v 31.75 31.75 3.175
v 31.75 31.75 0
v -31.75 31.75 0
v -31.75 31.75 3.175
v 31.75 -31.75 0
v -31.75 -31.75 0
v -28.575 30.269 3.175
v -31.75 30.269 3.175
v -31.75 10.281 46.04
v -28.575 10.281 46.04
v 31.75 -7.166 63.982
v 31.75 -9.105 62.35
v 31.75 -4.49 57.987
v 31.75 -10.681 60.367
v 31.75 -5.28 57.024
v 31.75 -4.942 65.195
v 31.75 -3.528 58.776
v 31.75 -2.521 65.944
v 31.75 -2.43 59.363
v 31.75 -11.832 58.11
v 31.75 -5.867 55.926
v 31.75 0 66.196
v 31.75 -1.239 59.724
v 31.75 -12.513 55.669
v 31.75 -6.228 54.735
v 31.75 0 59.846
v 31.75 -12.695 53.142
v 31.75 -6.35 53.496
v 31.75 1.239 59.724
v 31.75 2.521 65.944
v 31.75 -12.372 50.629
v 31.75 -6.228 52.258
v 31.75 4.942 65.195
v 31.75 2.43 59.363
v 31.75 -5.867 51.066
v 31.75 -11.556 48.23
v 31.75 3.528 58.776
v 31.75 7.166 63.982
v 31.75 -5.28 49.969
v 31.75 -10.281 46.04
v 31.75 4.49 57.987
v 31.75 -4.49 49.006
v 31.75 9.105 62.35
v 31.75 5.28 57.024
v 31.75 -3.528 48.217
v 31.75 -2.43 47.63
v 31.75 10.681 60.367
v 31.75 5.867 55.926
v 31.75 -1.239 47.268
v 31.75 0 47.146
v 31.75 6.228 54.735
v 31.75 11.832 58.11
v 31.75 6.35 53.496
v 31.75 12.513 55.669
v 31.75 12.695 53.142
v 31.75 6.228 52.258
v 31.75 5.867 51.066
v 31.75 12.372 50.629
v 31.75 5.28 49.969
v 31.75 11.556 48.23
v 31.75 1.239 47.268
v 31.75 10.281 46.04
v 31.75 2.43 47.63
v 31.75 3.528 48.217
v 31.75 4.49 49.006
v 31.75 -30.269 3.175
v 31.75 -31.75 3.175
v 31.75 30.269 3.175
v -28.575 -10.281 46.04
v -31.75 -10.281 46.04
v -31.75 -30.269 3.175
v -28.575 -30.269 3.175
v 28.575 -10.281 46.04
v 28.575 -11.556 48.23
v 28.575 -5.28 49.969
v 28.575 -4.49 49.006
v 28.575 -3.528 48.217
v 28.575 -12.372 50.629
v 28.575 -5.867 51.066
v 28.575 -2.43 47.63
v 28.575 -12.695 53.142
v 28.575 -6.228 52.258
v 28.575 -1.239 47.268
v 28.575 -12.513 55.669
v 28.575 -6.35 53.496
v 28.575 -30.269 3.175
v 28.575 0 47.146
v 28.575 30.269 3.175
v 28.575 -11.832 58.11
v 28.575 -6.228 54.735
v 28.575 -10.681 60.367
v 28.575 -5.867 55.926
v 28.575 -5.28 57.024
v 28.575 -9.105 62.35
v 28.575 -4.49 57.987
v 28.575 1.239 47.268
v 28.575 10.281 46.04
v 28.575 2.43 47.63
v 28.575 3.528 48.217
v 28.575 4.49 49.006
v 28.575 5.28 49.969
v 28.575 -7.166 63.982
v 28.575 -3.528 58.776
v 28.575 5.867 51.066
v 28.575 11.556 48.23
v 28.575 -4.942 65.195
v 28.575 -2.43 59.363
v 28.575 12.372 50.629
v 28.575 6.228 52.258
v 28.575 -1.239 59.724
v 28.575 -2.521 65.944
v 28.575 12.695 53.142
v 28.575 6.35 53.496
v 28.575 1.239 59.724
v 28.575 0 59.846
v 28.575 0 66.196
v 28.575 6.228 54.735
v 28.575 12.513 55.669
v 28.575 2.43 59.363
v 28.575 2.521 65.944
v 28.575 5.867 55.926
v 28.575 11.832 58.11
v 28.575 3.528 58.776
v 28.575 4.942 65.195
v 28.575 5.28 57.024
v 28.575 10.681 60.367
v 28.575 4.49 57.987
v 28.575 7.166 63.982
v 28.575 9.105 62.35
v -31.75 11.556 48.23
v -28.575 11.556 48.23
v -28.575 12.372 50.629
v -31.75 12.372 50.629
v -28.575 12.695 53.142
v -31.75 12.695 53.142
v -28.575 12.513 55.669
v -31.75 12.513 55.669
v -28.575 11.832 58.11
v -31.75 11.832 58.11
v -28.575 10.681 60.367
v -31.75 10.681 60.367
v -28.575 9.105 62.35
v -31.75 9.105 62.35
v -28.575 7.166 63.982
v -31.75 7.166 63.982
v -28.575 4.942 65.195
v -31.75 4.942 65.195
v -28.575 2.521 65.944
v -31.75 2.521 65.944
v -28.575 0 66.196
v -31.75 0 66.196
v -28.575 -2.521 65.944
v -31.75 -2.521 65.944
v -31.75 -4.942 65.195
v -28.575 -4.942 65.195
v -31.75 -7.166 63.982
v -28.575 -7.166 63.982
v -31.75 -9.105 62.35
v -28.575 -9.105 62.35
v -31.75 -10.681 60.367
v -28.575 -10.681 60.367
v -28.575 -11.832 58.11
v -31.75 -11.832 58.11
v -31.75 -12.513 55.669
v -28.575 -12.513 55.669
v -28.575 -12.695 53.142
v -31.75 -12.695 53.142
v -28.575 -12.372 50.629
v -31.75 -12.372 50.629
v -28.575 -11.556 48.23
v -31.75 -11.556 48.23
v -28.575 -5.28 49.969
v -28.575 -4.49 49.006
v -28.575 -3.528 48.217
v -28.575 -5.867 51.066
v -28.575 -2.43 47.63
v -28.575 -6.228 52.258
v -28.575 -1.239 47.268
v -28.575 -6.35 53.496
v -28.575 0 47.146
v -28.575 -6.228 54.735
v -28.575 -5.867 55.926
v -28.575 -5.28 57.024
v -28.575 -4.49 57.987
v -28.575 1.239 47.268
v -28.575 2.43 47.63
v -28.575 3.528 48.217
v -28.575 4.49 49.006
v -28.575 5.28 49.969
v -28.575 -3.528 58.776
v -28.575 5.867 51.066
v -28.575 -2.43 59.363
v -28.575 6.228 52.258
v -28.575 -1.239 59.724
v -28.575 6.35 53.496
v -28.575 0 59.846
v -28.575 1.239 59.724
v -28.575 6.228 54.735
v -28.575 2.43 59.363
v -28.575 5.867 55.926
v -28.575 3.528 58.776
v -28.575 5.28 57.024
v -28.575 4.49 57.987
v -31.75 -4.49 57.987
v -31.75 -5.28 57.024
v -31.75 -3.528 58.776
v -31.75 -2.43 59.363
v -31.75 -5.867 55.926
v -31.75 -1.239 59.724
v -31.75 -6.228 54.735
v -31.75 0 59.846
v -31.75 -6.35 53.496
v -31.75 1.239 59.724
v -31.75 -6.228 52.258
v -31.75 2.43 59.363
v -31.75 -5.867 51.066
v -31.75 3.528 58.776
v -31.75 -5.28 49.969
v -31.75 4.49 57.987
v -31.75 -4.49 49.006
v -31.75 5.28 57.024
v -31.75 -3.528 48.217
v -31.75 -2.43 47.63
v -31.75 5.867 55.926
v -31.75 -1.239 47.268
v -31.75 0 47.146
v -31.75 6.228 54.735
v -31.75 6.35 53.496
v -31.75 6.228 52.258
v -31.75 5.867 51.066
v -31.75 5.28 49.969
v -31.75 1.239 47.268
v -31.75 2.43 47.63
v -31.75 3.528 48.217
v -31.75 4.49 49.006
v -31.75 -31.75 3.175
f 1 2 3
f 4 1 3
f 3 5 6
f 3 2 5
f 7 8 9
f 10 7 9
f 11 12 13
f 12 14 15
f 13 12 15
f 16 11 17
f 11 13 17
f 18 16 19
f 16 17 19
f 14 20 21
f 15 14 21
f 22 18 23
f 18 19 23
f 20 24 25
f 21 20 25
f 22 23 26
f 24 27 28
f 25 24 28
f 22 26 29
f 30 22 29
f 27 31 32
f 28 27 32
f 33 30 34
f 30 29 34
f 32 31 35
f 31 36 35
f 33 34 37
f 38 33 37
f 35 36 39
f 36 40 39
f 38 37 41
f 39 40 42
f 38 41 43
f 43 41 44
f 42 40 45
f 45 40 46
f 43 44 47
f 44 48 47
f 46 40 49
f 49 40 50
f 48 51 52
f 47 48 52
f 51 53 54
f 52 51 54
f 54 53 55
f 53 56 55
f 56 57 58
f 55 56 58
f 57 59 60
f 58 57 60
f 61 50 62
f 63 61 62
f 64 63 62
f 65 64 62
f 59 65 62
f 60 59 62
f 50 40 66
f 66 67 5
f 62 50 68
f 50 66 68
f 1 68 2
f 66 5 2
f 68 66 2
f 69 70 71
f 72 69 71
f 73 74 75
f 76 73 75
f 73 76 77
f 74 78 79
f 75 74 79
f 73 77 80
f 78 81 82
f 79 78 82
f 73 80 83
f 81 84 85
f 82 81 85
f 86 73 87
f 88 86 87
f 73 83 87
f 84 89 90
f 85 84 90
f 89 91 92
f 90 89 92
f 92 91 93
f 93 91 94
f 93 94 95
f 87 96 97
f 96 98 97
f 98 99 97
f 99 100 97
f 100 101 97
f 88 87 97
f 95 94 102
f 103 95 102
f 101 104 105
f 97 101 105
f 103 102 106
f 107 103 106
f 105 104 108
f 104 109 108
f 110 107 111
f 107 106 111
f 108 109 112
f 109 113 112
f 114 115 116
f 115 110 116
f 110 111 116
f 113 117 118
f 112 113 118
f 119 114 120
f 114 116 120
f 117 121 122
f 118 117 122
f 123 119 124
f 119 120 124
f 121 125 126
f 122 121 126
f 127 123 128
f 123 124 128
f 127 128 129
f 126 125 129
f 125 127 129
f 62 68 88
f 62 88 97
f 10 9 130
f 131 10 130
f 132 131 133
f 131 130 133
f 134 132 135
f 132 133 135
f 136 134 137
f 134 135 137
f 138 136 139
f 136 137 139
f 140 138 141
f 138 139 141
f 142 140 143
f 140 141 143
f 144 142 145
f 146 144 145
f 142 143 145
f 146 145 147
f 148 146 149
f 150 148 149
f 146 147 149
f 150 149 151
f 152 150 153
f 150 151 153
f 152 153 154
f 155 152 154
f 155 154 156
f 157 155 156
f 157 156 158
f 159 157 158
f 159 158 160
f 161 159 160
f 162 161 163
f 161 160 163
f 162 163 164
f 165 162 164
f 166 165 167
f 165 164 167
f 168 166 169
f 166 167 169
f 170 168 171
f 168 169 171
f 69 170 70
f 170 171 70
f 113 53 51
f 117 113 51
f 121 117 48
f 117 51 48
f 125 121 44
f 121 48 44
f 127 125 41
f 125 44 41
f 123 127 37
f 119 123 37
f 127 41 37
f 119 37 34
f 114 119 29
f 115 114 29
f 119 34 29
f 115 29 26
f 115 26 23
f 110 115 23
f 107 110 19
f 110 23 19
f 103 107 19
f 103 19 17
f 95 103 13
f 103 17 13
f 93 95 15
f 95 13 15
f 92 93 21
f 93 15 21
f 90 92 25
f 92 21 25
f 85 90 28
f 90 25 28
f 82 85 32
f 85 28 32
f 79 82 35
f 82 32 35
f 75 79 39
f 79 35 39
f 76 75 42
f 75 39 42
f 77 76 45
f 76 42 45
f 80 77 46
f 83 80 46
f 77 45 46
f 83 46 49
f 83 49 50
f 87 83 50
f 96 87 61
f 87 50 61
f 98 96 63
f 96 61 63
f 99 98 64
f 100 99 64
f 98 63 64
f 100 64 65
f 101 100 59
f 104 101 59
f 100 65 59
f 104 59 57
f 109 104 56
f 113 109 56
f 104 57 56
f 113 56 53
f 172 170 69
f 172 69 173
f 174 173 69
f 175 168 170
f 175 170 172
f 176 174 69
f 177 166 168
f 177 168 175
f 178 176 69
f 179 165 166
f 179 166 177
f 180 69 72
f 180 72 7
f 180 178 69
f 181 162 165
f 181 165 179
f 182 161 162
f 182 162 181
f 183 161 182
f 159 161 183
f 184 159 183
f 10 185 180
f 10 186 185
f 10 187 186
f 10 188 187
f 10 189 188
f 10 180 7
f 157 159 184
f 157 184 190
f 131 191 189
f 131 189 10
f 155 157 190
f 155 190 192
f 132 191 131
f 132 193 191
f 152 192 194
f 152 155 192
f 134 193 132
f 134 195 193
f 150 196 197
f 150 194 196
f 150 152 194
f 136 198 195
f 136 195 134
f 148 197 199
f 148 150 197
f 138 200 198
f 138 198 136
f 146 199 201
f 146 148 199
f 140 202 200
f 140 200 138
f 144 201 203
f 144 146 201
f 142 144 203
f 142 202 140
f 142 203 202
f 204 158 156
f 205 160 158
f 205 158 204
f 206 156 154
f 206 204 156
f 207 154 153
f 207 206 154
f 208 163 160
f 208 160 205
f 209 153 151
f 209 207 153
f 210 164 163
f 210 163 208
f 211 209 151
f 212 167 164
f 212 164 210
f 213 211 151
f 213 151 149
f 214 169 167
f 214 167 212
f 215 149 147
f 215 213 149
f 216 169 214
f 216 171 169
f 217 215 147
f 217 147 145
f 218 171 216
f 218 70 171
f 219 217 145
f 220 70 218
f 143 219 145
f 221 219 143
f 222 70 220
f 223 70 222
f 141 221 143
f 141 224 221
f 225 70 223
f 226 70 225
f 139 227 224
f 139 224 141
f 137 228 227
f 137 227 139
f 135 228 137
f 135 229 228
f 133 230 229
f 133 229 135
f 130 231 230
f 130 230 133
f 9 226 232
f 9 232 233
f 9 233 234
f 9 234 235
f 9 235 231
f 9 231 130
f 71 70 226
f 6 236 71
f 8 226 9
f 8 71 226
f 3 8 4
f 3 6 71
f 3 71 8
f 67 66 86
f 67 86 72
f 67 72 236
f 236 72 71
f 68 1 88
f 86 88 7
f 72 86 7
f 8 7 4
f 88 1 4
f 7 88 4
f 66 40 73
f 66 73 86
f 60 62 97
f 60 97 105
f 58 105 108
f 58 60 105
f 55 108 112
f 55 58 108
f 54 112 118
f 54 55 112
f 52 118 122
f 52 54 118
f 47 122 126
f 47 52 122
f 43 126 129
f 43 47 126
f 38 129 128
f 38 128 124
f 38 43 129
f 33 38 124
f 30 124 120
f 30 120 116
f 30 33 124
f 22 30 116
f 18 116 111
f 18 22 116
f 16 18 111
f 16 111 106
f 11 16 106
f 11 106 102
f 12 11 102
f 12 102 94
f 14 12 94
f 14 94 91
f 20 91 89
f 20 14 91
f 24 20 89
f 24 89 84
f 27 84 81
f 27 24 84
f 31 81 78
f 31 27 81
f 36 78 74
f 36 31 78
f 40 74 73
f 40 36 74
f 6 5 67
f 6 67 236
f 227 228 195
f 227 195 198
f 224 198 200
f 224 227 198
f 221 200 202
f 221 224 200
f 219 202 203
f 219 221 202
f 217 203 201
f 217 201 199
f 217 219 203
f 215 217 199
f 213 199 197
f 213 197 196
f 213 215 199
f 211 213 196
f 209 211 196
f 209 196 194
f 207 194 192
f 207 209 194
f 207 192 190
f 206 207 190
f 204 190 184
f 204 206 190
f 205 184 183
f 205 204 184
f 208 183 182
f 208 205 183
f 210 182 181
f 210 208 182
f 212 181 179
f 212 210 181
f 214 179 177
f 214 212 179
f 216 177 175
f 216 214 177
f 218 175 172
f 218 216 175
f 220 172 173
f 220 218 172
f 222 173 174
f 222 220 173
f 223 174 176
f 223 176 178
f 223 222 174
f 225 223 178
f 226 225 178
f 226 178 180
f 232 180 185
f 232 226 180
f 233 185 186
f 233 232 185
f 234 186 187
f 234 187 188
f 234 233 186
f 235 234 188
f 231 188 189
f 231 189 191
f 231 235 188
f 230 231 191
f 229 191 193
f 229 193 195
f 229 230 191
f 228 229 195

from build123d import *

# Parameters (mm, degrees)
F0_W     = 31.75
F0_H     = 63.5
F1_DEPTH = 3.175
F2_R     = 6.35
F3_DEPTH = 3.175


with BuildPart() as f1:
    # F0 (on Top) → F1 (new body)
    with BuildSketch(Plane.XY):
        with Locations((15.875, 0)):
            Rectangle(F0_W, F0_H)
    extrude(amount=F1_DEPTH)

    # F2 (on face) → F3 (join)
    with BuildSketch(Plane.YZ.offset(31.75)):
        Polygon((-10.280992, 46.040436), (-30.269473, 3.175), (30.269473, 3.175), (10.280992, 46.040436), align=None)
        with BuildLine():
            ThreePointArc((10.280992, 46.040436), (0, 66.196386), (-10.280992, 46.040436))
            Line((-10.280992, 46.040436), (10.280992, 46.040436))
        make_face()
        with Locations((0, 53.496386)):
            Circle(F2_R, mode=Mode.SUBTRACT)
    extrude(amount=-F3_DEPTH)

    # F4: F1 across plane


with BuildPart() as f1_1:
    add(f1.part)
    add(f1.part.mirror(Plane.YZ))


solid = f1_1.part
